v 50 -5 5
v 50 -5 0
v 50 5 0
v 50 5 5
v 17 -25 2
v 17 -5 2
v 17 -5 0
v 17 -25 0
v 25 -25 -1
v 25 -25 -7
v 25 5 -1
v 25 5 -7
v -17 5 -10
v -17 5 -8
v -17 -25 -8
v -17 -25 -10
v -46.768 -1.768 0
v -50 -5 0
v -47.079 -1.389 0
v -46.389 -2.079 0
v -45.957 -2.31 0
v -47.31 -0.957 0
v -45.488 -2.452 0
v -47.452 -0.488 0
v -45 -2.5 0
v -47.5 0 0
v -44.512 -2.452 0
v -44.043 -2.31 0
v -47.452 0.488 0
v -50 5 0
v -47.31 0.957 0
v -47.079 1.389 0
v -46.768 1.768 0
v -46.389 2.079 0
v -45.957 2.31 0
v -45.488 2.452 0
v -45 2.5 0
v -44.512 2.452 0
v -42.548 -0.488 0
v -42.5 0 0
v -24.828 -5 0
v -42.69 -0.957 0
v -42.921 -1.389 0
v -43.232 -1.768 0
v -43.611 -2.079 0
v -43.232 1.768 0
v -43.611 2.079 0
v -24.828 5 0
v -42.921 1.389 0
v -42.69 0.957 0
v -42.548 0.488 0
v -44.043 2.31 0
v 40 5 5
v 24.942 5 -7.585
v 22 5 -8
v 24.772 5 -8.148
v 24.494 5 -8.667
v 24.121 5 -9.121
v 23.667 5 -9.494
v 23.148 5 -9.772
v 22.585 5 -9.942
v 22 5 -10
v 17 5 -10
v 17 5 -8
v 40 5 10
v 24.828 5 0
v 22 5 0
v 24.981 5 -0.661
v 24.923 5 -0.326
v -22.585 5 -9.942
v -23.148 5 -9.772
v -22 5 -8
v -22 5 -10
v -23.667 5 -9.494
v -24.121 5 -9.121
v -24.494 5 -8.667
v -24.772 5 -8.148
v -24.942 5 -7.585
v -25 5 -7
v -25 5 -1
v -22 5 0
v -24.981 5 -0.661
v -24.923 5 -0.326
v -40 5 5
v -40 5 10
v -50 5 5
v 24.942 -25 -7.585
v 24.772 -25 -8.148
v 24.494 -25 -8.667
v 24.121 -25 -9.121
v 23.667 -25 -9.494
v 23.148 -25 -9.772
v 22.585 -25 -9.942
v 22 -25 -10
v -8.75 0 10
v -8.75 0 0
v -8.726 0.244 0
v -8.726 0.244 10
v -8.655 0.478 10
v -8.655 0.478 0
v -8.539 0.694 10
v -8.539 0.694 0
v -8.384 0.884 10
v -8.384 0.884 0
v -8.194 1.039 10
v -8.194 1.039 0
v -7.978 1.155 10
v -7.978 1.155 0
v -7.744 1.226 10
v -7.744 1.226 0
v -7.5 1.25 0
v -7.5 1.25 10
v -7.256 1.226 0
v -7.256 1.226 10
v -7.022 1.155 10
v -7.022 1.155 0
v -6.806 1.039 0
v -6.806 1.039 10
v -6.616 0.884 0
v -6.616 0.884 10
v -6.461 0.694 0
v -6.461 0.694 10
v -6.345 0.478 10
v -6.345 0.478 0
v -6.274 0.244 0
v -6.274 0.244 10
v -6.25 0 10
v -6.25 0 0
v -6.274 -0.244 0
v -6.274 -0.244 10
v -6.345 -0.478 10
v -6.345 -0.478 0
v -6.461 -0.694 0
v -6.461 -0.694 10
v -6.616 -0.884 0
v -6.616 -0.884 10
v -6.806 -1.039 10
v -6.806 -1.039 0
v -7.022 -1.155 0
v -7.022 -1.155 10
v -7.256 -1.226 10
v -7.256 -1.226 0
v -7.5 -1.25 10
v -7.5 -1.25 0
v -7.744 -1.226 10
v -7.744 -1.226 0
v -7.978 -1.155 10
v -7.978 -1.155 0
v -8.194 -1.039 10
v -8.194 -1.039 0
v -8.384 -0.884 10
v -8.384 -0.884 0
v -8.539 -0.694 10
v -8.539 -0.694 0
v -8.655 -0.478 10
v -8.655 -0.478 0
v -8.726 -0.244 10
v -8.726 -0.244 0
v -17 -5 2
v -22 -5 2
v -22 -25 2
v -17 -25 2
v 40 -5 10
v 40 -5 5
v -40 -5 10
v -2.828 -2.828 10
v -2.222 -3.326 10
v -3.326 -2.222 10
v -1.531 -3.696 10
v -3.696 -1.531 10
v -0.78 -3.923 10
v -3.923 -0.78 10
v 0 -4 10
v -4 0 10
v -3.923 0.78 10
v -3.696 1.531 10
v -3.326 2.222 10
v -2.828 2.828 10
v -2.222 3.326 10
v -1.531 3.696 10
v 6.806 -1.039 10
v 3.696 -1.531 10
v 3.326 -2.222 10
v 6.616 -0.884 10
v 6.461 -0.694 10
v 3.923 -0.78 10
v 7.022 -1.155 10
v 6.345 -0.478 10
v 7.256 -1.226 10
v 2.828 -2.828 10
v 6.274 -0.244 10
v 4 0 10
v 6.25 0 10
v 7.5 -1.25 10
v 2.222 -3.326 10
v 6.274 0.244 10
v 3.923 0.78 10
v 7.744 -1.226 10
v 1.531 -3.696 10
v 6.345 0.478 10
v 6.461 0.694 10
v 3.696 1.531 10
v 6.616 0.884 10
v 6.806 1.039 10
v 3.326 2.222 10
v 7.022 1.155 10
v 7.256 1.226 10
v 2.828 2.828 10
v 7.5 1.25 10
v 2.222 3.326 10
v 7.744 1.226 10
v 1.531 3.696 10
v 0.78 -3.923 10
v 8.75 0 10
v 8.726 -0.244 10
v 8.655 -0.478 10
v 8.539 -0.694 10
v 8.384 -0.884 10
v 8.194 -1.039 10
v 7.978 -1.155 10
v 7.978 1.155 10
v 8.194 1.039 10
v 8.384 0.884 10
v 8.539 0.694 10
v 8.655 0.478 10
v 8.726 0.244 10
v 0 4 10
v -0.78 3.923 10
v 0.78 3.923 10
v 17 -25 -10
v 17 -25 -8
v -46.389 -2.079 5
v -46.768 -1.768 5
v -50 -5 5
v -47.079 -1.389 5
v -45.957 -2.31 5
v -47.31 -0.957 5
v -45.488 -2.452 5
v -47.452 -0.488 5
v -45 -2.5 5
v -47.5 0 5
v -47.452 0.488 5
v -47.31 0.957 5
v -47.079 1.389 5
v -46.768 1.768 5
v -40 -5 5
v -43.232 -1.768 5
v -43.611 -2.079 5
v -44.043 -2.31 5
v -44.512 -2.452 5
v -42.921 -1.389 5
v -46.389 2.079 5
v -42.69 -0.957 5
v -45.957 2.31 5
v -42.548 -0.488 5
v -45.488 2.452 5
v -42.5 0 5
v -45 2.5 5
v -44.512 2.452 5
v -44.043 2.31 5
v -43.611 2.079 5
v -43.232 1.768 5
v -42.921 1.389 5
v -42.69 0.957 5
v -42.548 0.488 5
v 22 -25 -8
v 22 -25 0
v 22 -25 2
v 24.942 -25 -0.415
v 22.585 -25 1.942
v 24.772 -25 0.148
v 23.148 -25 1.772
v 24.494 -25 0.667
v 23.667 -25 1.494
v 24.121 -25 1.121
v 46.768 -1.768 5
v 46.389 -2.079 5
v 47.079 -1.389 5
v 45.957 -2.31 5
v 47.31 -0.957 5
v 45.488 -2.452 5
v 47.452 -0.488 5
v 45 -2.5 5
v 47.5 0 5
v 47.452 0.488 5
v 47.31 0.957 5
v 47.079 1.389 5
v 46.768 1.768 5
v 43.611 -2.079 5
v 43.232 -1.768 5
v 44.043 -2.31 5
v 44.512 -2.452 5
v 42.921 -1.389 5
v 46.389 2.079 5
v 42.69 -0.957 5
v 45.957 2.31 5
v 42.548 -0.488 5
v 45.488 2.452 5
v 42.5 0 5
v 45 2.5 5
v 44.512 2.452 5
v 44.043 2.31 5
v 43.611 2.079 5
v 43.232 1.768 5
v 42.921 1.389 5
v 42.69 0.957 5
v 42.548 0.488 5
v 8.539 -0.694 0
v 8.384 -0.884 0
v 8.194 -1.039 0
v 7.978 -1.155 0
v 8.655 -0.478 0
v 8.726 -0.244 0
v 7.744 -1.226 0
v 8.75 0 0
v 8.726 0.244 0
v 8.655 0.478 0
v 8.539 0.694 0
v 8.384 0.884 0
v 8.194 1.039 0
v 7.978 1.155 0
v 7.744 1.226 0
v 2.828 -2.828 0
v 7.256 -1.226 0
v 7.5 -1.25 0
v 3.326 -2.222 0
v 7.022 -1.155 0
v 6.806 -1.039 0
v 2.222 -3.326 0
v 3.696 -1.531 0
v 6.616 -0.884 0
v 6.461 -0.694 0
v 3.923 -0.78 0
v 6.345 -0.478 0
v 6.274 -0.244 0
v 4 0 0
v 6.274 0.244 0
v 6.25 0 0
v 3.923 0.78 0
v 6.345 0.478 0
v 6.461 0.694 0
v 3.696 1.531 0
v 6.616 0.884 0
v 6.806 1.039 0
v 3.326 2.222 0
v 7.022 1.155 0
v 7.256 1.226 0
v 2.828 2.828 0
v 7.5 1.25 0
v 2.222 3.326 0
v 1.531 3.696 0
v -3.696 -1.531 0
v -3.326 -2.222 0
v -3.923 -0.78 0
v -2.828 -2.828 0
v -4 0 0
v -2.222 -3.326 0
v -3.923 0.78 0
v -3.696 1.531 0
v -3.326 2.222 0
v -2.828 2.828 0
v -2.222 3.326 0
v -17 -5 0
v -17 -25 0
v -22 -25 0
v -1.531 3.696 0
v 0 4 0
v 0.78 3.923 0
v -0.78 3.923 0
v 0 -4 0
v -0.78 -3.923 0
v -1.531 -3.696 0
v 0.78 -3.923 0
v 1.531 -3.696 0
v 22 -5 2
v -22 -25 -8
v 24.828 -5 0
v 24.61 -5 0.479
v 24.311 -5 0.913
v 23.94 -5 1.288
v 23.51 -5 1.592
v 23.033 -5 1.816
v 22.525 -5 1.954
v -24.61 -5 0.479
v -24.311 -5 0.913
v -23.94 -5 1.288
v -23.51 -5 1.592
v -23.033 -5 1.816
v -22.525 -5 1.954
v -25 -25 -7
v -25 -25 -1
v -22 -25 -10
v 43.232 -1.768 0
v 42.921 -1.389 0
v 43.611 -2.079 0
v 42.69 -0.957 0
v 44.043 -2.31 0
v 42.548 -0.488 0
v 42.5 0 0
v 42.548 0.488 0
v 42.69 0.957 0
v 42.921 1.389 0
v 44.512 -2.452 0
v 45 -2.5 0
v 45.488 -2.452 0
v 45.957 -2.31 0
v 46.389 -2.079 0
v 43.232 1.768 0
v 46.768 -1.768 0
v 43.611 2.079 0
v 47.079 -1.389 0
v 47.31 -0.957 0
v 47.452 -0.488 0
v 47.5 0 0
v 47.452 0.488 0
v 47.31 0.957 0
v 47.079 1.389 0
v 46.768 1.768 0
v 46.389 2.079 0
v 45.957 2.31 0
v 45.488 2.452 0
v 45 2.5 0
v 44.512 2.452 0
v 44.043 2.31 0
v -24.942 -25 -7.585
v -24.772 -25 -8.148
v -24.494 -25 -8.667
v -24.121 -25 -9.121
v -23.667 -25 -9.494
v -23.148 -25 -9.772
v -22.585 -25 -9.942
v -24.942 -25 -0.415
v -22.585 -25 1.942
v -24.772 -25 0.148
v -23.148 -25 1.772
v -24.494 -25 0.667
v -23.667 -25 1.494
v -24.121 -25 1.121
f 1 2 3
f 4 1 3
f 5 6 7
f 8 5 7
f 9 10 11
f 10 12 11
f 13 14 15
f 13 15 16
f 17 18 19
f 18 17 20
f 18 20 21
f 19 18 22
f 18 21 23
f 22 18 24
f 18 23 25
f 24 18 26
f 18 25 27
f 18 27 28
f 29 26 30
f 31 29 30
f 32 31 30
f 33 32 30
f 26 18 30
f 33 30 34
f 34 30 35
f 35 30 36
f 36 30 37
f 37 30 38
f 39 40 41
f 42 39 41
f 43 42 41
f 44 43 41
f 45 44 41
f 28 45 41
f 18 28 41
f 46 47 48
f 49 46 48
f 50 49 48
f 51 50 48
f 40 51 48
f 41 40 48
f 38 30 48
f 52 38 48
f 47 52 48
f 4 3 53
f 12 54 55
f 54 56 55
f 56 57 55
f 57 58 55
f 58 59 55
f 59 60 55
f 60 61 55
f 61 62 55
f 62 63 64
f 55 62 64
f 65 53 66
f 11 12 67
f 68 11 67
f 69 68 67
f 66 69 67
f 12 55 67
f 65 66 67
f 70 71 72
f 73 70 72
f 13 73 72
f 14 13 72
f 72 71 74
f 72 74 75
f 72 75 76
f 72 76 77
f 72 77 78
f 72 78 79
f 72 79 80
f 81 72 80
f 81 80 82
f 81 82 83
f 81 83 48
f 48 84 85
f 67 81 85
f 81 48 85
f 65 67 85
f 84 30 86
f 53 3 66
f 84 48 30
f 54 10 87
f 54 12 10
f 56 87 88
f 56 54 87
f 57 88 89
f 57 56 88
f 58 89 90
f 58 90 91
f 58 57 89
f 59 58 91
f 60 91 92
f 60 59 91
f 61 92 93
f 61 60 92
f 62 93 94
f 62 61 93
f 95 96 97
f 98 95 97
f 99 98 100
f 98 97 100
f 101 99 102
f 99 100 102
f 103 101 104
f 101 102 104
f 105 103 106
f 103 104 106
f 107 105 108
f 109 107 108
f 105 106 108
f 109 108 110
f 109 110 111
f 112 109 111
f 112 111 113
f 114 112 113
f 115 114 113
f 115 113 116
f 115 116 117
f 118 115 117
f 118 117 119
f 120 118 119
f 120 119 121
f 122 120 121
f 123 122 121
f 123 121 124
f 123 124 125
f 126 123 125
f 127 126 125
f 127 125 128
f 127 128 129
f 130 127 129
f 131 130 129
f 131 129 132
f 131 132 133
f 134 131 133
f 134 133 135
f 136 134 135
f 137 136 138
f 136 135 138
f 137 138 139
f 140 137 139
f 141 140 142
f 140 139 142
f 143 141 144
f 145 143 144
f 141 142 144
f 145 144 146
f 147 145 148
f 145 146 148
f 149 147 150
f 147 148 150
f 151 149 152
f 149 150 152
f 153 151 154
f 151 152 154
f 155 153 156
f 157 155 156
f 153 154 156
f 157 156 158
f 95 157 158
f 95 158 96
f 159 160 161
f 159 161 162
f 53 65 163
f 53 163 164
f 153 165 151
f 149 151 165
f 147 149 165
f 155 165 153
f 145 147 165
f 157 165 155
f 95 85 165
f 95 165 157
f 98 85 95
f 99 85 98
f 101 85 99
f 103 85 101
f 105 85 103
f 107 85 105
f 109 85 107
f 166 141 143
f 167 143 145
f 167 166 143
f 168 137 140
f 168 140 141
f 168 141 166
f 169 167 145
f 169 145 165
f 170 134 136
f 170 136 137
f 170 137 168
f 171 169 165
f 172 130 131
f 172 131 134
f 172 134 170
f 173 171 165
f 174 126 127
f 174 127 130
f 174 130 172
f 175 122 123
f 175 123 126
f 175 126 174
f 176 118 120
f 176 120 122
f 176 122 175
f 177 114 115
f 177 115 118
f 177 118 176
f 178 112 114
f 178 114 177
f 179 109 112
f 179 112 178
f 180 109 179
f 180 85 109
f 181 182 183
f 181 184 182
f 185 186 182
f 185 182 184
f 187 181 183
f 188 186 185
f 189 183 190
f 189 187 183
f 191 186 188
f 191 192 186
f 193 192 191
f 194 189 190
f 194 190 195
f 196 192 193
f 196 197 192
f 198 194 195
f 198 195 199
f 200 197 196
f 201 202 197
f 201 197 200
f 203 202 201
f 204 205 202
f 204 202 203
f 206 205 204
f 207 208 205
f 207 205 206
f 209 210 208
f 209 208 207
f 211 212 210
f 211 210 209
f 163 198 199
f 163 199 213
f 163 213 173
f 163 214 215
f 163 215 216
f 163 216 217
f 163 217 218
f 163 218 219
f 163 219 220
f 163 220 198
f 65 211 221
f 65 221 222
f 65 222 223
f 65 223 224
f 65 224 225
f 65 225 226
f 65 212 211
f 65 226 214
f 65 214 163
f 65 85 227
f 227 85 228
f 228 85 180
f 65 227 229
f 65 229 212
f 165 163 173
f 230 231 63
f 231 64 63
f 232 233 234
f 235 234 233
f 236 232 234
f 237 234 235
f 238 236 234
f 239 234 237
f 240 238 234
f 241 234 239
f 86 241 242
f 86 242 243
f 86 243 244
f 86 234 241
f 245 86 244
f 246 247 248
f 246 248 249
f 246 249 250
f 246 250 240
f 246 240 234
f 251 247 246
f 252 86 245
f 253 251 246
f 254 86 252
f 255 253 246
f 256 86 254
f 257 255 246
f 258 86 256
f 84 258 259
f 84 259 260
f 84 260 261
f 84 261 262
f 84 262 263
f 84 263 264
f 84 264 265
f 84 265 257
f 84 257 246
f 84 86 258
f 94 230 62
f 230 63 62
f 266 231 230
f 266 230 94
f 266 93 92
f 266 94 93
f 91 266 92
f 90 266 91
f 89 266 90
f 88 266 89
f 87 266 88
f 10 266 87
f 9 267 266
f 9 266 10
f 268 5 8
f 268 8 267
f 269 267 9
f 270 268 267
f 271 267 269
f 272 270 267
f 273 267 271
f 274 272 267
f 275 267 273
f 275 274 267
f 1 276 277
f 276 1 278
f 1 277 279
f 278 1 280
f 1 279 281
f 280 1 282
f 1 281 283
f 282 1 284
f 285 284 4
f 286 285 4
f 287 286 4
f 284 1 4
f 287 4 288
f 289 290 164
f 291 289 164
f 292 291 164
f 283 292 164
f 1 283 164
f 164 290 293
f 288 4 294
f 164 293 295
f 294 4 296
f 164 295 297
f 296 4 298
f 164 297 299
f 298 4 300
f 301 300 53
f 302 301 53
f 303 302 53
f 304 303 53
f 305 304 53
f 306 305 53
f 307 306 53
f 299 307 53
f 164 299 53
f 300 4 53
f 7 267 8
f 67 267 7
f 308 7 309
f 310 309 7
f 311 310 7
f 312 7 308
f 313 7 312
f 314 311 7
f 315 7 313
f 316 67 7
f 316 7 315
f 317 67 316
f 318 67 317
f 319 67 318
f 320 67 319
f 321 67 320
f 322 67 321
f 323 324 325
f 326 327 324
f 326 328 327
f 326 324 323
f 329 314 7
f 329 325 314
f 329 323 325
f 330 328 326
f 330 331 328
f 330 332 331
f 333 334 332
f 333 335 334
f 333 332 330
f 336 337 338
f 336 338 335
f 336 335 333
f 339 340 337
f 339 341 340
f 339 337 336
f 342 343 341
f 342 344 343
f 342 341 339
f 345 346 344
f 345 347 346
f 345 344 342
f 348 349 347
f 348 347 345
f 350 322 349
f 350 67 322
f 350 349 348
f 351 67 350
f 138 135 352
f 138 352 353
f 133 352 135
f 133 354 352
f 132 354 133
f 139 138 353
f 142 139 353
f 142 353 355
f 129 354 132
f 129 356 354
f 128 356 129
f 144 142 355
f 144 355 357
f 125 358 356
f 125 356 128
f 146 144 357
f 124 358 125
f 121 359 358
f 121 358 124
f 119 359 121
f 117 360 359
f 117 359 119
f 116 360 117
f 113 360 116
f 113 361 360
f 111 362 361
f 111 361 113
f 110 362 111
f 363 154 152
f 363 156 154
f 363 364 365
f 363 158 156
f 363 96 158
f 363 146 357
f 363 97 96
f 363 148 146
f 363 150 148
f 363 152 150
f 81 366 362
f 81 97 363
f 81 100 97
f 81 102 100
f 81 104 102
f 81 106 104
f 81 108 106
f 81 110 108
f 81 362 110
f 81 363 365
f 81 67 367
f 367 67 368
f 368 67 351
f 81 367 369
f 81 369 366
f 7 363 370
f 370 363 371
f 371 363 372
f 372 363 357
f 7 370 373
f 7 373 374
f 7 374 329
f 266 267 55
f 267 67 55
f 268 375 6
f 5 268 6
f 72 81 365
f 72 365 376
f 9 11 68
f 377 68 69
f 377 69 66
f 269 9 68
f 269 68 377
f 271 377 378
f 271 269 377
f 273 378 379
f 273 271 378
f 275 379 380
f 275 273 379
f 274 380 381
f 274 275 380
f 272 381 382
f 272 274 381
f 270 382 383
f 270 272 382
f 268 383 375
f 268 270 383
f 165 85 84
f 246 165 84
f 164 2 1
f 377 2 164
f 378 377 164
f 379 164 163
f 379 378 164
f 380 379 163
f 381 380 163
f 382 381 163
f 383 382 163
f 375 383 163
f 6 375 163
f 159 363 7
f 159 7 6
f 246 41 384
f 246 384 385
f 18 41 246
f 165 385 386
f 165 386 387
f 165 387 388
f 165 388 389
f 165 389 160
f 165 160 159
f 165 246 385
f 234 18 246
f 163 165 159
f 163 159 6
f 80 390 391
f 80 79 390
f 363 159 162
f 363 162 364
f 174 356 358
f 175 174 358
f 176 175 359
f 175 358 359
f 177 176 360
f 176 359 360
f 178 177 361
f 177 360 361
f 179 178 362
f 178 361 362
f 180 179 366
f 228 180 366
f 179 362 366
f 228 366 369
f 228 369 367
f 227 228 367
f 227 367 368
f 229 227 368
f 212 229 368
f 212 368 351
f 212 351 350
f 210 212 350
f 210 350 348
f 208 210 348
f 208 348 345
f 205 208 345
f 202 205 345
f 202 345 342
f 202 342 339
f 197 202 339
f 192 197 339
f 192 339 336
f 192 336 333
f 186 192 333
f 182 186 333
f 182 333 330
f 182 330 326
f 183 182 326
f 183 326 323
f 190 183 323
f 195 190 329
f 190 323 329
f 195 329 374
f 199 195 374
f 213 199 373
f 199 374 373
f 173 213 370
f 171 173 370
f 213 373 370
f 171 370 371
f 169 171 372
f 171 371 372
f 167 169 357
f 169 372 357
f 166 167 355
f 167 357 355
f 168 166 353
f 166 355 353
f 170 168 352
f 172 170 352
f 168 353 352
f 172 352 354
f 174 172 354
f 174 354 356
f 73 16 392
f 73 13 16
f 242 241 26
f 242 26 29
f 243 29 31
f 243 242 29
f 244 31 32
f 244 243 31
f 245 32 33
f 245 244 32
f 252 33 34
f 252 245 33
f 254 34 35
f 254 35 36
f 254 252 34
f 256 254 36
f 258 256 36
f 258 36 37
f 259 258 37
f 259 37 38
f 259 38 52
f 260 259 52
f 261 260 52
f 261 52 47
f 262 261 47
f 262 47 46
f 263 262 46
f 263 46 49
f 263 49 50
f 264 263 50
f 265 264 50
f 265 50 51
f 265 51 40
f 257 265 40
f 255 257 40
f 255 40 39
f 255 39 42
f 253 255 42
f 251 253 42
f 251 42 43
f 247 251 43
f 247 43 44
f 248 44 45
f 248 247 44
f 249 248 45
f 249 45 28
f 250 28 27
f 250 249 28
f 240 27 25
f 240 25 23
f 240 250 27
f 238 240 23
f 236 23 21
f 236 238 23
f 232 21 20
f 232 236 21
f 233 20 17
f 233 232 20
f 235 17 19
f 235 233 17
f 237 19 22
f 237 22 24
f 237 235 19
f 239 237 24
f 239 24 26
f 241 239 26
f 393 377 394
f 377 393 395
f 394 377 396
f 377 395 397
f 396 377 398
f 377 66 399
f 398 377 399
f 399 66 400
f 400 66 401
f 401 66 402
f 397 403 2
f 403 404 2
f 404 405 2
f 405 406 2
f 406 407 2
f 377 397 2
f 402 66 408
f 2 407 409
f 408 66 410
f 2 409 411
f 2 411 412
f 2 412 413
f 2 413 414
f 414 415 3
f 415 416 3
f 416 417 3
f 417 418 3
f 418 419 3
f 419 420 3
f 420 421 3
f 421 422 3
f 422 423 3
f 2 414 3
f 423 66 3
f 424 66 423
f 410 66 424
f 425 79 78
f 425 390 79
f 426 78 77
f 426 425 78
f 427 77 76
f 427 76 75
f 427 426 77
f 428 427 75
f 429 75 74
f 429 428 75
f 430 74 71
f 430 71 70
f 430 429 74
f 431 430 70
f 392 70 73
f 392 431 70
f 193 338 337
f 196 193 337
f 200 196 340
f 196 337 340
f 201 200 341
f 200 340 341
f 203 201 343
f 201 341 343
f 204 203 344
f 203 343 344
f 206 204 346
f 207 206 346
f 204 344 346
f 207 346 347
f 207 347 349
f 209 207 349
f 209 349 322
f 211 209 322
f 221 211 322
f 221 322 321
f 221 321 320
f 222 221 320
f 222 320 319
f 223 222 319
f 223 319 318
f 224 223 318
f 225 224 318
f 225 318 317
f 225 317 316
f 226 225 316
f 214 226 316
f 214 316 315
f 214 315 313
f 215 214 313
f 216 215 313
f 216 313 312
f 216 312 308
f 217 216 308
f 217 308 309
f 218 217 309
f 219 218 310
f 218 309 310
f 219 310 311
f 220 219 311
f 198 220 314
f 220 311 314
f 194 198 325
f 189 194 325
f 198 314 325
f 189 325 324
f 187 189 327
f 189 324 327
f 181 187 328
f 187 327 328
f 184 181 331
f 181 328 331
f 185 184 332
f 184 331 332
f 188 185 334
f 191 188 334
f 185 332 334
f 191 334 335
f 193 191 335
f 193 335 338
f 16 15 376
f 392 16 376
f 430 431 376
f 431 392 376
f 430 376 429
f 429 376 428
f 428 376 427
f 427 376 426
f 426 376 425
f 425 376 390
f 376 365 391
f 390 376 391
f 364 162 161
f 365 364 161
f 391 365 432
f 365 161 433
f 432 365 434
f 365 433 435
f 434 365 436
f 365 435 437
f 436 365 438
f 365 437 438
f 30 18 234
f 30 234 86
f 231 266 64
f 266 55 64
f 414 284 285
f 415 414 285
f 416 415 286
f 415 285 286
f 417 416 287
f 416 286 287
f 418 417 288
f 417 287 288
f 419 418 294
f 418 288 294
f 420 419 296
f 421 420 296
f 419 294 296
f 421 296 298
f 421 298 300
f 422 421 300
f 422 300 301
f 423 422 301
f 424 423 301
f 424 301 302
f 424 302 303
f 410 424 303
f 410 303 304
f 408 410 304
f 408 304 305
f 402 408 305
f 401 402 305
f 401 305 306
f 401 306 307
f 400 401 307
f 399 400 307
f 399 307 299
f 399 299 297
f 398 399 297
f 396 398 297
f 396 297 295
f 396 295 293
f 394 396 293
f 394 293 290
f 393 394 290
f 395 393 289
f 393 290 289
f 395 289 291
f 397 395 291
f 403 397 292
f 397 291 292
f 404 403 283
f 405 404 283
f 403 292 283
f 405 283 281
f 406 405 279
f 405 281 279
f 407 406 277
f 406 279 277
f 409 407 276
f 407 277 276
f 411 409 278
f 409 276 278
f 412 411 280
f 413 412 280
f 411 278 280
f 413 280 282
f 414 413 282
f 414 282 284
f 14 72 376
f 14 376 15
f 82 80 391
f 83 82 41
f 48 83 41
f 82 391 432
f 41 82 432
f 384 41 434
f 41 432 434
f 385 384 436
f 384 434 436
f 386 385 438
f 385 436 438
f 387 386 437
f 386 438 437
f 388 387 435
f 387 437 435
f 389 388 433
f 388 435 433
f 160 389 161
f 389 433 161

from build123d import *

# Parameters (mm, degrees)
SKETCH1_W           = 100
SKETCH1_H           = 10
BOSS_EXTRUDE1_DEPTH = 10
SKETCH6_W           = 3
SKETCH6_H           = 10
BOSS_EXTRUDE2_DEPTH = 10
SKETCH8_W           = 2
SKETCH8_H           = 10
BOSS_EXTRUDE3_DEPTH = 5
BOSS_EXTRUDE4_DEPTH = 20
SKETCH2_W           = 10
SKETCH2_H           = 5
CUT_EXTRUDE1_DEPTH  = 10
CUT_EXTRUDE2_REACH  = 59.879
SKETCH10_R          = 2.5
CUT_EXTRUDE3_REACH  = 58.789
SKETCH13_R          = 4
SKETCH13_R_2        = 1.25
FILLET1_R           = 3
FILLET2_R           = 3


with BuildPart() as part:
    # Sketch1 → Boss-Extrude1 (new body)
    with BuildSketch(Plane.XY):
        Rectangle(SKETCH1_W, SKETCH1_H)
    extrude(amount=BOSS_EXTRUDE1_DEPTH)

    # Sketch6 → Boss-Extrude2 (add)
    with BuildSketch(Plane(origin=(0, 0, 0), x_dir=(-1, 0, 0), z_dir=(0, 0, -1))):
        with Locations((-23.5, 0)):
            Rectangle(SKETCH6_W, SKETCH6_H)
    boss_extrude2 = extrude(amount=BOSS_EXTRUDE2_DEPTH)

    # Sketch8 → Boss-Extrude3 (add)
    with BuildSketch(Plane.ZY.offset(-22)):
        with Locations((-9, 0)):
            Rectangle(SKETCH8_W, SKETCH8_H)
    boss_extrude3 = extrude(amount=BOSS_EXTRUDE3_DEPTH)

    # Sketch9 → Boss-Extrude4 (add)
    with BuildSketch(Plane.XZ.offset(5)):
        Polygon((17, 2), (17, 0), (22, 0), (22, -8), (17, -8), (17, -10), (25, -10), (25, 0), (25, 2), align=None)
    boss_extrude4 = extrude(amount=BOSS_EXTRUDE4_DEPTH)

    # Mirror3: Boss-Extrude2, Boss-Extrude3, Boss-Extrude4 across plane
    add(boss_extrude2.mirror(Plane(origin=(0, 0, 0), x_dir=(0, 0, 1), z_dir=(1, 0, 0))))
    add(boss_extrude3.mirror(Plane(origin=(0, 0, 0), x_dir=(0, 0, 1), z_dir=(1, 0, 0))))
    add(boss_extrude4.mirror(Plane(origin=(0, 0, 0), x_dir=(0, 0, 1), z_dir=(1, 0, 0))))

    # Sketch2 → Cut-Extrude1 (cut)
    with BuildSketch(Plane(origin=(0, 5, 0), x_dir=(1, 0, 0), z_dir=(0, 1, 0))):
        with Locations((-45, -7.5)):
            Rectangle(SKETCH2_W, SKETCH2_H)
    cut_extrude1 = extrude(amount=-CUT_EXTRUDE1_DEPTH, mode=Mode.SUBTRACT)

    # Mirror4: Cut-Extrude1 across plane
    add(cut_extrude1.mirror(Plane(origin=(0, 0, 0), x_dir=(0, 0, 1), z_dir=(1, 0, 0))), mode=Mode.SUBTRACT)

    # Sketch10 → Cut-Extrude2 (cut, up to next)
    with BuildSketch(Plane.XY.offset(5), mode=Mode.PRIVATE) as cut_extrude2_sk1:
        with Locations((45, 0)):
            Circle(SKETCH10_R)
    cut_extrude2_tool1 = extrude(cut_extrude2_sk1.sketch, amount=-CUT_EXTRUDE2_REACH, mode=Mode.PRIVATE) & part.part
    cut_extrude2 = cut_extrude2_tool1.solids().sort_by_distance((45, 0, 5))[0]
    add(cut_extrude2, mode=Mode.SUBTRACT)

    # Mirror5: Cut-Extrude2 across plane
    add(cut_extrude2.mirror(Plane(origin=(0, 0, 0), x_dir=(0, 0, 1), z_dir=(1, 0, 0))), mode=Mode.SUBTRACT)

    # Sketch13 → Cut-Extrude3 (cut, up to next)
    with BuildSketch(Plane(origin=(0, 0, 0), x_dir=(-1, 0, 0), z_dir=(0, 0, -1)), mode=Mode.PRIVATE) as cut_extrude3_sk1:
        Circle(SKETCH13_R)
    cut_extrude3_tool1 = extrude(cut_extrude3_sk1.sketch, amount=-CUT_EXTRUDE3_REACH, mode=Mode.PRIVATE) & part.part
    # Sketch13 → Cut-Extrude3 (cut, up to next)
    with BuildSketch(Plane(origin=(0, 0, 0), x_dir=(-1, 0, 0), z_dir=(0, 0, -1)), mode=Mode.PRIVATE) as cut_extrude3_sk2:
        with Locations((-7.5, 0)):
            Circle(SKETCH13_R_2)
    cut_extrude3_tool2 = extrude(cut_extrude3_sk2.sketch, amount=-CUT_EXTRUDE3_REACH, mode=Mode.PRIVATE) & part.part
    # Sketch13 → Cut-Extrude3 (cut, up to next)
    with BuildSketch(Plane(origin=(0, 0, 0), x_dir=(-1, 0, 0), z_dir=(0, 0, -1)), mode=Mode.PRIVATE) as cut_extrude3_sk3:
        with Locations((7.5, 0)):
            Circle(SKETCH13_R_2)
    cut_extrude3_tool3 = extrude(cut_extrude3_sk3.sketch, amount=-CUT_EXTRUDE3_REACH, mode=Mode.PRIVATE) & part.part
    add(cut_extrude3_tool1.solids().sort_by_distance((0, 0, 0))[0], mode=Mode.SUBTRACT)
    add(cut_extrude3_tool2.solids().sort_by_distance((7.5, 0, 0))[0], mode=Mode.SUBTRACT)
    add(cut_extrude3_tool3.solids().sort_by_distance((-7.5, 0, 0))[0], mode=Mode.SUBTRACT)

    # Fillet1
    fillet1_edges = [part.edges().sort_by_distance(p)[0] for p in [
        (25, -10, -10),
        (-25, -10, -10),
    ]]
    fillet(fillet1_edges, radius=FILLET1_R)

    # Fillet2
    fillet2_edges = [part.edges().sort_by_distance(p)[0] for p in [
        (-25, -15, 2),
        (25, -15, 2),
    ]]
    fillet(fillet2_edges, radius=FILLET2_R)


solid = part.part
